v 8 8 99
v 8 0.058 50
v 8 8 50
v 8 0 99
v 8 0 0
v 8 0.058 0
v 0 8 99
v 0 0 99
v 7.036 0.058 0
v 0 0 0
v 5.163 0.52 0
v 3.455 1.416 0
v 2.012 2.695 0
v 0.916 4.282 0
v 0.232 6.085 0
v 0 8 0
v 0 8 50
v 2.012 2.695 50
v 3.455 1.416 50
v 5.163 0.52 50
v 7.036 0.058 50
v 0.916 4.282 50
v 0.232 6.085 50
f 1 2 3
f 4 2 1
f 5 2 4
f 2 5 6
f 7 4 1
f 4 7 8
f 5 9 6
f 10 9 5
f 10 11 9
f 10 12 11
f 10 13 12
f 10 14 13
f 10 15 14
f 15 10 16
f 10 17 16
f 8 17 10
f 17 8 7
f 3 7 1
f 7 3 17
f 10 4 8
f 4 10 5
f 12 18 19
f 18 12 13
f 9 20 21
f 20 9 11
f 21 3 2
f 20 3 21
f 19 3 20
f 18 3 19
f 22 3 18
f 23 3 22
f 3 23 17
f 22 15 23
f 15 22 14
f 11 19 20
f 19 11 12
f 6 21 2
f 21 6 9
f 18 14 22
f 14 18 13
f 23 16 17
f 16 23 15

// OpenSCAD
// file: functions.scad
// PRUSA Mendel  
// Functions used in many files
// GNU GPL v3
// Josef Průša
// josefprusa@me.com
// prusadjs.cz
// http://www.reprap.org/wiki/Prusa_Mendel
// http://github.com/prusajr/PrusaMendel


module nut(d,h,horizontal=true)
{
  cornerdiameter =  (d / 2) / cos (180 / 6);
  cylinder(h = h, r = cornerdiameter, $fn = 6);
  if(horizontal) {
    for(i = [1:6]) {
      rotate([0,0,60*i]) 
        translate([-cornerdiameter-0.2,0,0])
          rotate([0,0,-45])
            cube(size = [2,2,h]);
     }
  }
}

// Based on nophead research
module polyhole(d,h) 
{
    n = max(round(2 * d),3);
    rotate([0,0,180])
        cylinder(h = h, r = (d / 2) / cos (180 / n), $fn = n);
}



module roundcorner(diameter)
{
  difference() {
    cube(size = [diameter,diameter,99], center = false);
    translate(v = [diameter, diameter, 0]) 
      cylinder(h = 100, r=diameter, center=true);
  }
}
// file: configuration.scad
//------------------------------------
//-- Miniskybot 2 configuration file
//------------------------------------

//-- drills
drill_M3 = 3.2;

//-- captive Nuts
nut_h = 2.6;
nut_radius = 6.6/2;

//------------------------------------------------
//-- Servo parameters
//-- See the doc/futaba-doc.pdf file
//------------------------------------------------
//-- Servo futaba 3003 dimensions
servo_c1 = 20;
servo_c2 = 7.5;
servo_c3 = 26.4;
servo_c4 = 40.3;
servo_c5 = 30.3;
servo_c6 = 10;
servo_c7 = 11.6;
servo_c8 = 4.1;
servo_c9 = 5.2;
servo_c10 = 9.6;

//-------------------------------------------
//-- Battery holder parameters
//-- See the doc/battery_holder.pdf file
//-------------------------------------------
battery_c1 = 49;
battery_c2 = 51.5;
battery_c3 = 12;
battery_ear_diam = 9;
battery_ear_h = 3;
battery_top_gap = 1;  
//-- Real battery height whith batteries inserted
battery_height = battery_c3 + battery_top_gap;

//----------------------------------
//-- Rear part parameters
//-- See the doc/rear-doc.dxf file
//----------------------------------
rear_c1 = servo_c2 + 3;
rear_c2 = servo_c3*2;
rear_c3 = servo_c1 + battery_height -battery_ear_h;
rear_edge_rad = 3;

//-- Ball caster parameters
WallThickness = 2.25; //thickness of the retaining wall
BallSize = 16.4;  //diameter of  your ball bearing.
Airgap = .65;  // Gap between ball and wall  
BallProtrude = .35; //percentage of ball radius sticking out 
//WheelDiameter = 56;  //what size wheels you will use.

//-------------------------------------------------
//-- Wheels parameters. 
//-- See the doc/wheel-doc.pdf
//------------------------------------------------
wheel_or_idiam = 50;                   //-- O-ring inner diameter
wheel_or_diam = 3;                     //-- O-ring section diameter
wheel_height = 2*wheel_or_diam+0;     //-- Wheel height: change the 0 for 
                                      //-- other value (0 equals minimun height)
                                      
//-- Wheel diameter is calculated from the o_ring                                      
wheels_diam = wheel_or_idiam + 2*wheel_or_diam;
wheel_gap = 1;  //-- For the final view. space between servo and wheel

//-- ultrasounds
ultrasound_hole = 16.5;
ultrasound_base_lx = 24+1;
ultrasound_base_ly = 20+1;
ultrasound_base_lz = 3;
ultrasound_length = 12.5;
ultrasound_drill_1 = [-9,7,0];
ultrasound_drill_2 = [9,-8,0];
// main file
//-- Miniskybot 2

include <configuration.scad>
include <functions.scad>

//cube([10,10,10]);

//nut(d=6, h=3, horizontal=true);

//polyhole(d=6, h=10);

roundcorner(8);
